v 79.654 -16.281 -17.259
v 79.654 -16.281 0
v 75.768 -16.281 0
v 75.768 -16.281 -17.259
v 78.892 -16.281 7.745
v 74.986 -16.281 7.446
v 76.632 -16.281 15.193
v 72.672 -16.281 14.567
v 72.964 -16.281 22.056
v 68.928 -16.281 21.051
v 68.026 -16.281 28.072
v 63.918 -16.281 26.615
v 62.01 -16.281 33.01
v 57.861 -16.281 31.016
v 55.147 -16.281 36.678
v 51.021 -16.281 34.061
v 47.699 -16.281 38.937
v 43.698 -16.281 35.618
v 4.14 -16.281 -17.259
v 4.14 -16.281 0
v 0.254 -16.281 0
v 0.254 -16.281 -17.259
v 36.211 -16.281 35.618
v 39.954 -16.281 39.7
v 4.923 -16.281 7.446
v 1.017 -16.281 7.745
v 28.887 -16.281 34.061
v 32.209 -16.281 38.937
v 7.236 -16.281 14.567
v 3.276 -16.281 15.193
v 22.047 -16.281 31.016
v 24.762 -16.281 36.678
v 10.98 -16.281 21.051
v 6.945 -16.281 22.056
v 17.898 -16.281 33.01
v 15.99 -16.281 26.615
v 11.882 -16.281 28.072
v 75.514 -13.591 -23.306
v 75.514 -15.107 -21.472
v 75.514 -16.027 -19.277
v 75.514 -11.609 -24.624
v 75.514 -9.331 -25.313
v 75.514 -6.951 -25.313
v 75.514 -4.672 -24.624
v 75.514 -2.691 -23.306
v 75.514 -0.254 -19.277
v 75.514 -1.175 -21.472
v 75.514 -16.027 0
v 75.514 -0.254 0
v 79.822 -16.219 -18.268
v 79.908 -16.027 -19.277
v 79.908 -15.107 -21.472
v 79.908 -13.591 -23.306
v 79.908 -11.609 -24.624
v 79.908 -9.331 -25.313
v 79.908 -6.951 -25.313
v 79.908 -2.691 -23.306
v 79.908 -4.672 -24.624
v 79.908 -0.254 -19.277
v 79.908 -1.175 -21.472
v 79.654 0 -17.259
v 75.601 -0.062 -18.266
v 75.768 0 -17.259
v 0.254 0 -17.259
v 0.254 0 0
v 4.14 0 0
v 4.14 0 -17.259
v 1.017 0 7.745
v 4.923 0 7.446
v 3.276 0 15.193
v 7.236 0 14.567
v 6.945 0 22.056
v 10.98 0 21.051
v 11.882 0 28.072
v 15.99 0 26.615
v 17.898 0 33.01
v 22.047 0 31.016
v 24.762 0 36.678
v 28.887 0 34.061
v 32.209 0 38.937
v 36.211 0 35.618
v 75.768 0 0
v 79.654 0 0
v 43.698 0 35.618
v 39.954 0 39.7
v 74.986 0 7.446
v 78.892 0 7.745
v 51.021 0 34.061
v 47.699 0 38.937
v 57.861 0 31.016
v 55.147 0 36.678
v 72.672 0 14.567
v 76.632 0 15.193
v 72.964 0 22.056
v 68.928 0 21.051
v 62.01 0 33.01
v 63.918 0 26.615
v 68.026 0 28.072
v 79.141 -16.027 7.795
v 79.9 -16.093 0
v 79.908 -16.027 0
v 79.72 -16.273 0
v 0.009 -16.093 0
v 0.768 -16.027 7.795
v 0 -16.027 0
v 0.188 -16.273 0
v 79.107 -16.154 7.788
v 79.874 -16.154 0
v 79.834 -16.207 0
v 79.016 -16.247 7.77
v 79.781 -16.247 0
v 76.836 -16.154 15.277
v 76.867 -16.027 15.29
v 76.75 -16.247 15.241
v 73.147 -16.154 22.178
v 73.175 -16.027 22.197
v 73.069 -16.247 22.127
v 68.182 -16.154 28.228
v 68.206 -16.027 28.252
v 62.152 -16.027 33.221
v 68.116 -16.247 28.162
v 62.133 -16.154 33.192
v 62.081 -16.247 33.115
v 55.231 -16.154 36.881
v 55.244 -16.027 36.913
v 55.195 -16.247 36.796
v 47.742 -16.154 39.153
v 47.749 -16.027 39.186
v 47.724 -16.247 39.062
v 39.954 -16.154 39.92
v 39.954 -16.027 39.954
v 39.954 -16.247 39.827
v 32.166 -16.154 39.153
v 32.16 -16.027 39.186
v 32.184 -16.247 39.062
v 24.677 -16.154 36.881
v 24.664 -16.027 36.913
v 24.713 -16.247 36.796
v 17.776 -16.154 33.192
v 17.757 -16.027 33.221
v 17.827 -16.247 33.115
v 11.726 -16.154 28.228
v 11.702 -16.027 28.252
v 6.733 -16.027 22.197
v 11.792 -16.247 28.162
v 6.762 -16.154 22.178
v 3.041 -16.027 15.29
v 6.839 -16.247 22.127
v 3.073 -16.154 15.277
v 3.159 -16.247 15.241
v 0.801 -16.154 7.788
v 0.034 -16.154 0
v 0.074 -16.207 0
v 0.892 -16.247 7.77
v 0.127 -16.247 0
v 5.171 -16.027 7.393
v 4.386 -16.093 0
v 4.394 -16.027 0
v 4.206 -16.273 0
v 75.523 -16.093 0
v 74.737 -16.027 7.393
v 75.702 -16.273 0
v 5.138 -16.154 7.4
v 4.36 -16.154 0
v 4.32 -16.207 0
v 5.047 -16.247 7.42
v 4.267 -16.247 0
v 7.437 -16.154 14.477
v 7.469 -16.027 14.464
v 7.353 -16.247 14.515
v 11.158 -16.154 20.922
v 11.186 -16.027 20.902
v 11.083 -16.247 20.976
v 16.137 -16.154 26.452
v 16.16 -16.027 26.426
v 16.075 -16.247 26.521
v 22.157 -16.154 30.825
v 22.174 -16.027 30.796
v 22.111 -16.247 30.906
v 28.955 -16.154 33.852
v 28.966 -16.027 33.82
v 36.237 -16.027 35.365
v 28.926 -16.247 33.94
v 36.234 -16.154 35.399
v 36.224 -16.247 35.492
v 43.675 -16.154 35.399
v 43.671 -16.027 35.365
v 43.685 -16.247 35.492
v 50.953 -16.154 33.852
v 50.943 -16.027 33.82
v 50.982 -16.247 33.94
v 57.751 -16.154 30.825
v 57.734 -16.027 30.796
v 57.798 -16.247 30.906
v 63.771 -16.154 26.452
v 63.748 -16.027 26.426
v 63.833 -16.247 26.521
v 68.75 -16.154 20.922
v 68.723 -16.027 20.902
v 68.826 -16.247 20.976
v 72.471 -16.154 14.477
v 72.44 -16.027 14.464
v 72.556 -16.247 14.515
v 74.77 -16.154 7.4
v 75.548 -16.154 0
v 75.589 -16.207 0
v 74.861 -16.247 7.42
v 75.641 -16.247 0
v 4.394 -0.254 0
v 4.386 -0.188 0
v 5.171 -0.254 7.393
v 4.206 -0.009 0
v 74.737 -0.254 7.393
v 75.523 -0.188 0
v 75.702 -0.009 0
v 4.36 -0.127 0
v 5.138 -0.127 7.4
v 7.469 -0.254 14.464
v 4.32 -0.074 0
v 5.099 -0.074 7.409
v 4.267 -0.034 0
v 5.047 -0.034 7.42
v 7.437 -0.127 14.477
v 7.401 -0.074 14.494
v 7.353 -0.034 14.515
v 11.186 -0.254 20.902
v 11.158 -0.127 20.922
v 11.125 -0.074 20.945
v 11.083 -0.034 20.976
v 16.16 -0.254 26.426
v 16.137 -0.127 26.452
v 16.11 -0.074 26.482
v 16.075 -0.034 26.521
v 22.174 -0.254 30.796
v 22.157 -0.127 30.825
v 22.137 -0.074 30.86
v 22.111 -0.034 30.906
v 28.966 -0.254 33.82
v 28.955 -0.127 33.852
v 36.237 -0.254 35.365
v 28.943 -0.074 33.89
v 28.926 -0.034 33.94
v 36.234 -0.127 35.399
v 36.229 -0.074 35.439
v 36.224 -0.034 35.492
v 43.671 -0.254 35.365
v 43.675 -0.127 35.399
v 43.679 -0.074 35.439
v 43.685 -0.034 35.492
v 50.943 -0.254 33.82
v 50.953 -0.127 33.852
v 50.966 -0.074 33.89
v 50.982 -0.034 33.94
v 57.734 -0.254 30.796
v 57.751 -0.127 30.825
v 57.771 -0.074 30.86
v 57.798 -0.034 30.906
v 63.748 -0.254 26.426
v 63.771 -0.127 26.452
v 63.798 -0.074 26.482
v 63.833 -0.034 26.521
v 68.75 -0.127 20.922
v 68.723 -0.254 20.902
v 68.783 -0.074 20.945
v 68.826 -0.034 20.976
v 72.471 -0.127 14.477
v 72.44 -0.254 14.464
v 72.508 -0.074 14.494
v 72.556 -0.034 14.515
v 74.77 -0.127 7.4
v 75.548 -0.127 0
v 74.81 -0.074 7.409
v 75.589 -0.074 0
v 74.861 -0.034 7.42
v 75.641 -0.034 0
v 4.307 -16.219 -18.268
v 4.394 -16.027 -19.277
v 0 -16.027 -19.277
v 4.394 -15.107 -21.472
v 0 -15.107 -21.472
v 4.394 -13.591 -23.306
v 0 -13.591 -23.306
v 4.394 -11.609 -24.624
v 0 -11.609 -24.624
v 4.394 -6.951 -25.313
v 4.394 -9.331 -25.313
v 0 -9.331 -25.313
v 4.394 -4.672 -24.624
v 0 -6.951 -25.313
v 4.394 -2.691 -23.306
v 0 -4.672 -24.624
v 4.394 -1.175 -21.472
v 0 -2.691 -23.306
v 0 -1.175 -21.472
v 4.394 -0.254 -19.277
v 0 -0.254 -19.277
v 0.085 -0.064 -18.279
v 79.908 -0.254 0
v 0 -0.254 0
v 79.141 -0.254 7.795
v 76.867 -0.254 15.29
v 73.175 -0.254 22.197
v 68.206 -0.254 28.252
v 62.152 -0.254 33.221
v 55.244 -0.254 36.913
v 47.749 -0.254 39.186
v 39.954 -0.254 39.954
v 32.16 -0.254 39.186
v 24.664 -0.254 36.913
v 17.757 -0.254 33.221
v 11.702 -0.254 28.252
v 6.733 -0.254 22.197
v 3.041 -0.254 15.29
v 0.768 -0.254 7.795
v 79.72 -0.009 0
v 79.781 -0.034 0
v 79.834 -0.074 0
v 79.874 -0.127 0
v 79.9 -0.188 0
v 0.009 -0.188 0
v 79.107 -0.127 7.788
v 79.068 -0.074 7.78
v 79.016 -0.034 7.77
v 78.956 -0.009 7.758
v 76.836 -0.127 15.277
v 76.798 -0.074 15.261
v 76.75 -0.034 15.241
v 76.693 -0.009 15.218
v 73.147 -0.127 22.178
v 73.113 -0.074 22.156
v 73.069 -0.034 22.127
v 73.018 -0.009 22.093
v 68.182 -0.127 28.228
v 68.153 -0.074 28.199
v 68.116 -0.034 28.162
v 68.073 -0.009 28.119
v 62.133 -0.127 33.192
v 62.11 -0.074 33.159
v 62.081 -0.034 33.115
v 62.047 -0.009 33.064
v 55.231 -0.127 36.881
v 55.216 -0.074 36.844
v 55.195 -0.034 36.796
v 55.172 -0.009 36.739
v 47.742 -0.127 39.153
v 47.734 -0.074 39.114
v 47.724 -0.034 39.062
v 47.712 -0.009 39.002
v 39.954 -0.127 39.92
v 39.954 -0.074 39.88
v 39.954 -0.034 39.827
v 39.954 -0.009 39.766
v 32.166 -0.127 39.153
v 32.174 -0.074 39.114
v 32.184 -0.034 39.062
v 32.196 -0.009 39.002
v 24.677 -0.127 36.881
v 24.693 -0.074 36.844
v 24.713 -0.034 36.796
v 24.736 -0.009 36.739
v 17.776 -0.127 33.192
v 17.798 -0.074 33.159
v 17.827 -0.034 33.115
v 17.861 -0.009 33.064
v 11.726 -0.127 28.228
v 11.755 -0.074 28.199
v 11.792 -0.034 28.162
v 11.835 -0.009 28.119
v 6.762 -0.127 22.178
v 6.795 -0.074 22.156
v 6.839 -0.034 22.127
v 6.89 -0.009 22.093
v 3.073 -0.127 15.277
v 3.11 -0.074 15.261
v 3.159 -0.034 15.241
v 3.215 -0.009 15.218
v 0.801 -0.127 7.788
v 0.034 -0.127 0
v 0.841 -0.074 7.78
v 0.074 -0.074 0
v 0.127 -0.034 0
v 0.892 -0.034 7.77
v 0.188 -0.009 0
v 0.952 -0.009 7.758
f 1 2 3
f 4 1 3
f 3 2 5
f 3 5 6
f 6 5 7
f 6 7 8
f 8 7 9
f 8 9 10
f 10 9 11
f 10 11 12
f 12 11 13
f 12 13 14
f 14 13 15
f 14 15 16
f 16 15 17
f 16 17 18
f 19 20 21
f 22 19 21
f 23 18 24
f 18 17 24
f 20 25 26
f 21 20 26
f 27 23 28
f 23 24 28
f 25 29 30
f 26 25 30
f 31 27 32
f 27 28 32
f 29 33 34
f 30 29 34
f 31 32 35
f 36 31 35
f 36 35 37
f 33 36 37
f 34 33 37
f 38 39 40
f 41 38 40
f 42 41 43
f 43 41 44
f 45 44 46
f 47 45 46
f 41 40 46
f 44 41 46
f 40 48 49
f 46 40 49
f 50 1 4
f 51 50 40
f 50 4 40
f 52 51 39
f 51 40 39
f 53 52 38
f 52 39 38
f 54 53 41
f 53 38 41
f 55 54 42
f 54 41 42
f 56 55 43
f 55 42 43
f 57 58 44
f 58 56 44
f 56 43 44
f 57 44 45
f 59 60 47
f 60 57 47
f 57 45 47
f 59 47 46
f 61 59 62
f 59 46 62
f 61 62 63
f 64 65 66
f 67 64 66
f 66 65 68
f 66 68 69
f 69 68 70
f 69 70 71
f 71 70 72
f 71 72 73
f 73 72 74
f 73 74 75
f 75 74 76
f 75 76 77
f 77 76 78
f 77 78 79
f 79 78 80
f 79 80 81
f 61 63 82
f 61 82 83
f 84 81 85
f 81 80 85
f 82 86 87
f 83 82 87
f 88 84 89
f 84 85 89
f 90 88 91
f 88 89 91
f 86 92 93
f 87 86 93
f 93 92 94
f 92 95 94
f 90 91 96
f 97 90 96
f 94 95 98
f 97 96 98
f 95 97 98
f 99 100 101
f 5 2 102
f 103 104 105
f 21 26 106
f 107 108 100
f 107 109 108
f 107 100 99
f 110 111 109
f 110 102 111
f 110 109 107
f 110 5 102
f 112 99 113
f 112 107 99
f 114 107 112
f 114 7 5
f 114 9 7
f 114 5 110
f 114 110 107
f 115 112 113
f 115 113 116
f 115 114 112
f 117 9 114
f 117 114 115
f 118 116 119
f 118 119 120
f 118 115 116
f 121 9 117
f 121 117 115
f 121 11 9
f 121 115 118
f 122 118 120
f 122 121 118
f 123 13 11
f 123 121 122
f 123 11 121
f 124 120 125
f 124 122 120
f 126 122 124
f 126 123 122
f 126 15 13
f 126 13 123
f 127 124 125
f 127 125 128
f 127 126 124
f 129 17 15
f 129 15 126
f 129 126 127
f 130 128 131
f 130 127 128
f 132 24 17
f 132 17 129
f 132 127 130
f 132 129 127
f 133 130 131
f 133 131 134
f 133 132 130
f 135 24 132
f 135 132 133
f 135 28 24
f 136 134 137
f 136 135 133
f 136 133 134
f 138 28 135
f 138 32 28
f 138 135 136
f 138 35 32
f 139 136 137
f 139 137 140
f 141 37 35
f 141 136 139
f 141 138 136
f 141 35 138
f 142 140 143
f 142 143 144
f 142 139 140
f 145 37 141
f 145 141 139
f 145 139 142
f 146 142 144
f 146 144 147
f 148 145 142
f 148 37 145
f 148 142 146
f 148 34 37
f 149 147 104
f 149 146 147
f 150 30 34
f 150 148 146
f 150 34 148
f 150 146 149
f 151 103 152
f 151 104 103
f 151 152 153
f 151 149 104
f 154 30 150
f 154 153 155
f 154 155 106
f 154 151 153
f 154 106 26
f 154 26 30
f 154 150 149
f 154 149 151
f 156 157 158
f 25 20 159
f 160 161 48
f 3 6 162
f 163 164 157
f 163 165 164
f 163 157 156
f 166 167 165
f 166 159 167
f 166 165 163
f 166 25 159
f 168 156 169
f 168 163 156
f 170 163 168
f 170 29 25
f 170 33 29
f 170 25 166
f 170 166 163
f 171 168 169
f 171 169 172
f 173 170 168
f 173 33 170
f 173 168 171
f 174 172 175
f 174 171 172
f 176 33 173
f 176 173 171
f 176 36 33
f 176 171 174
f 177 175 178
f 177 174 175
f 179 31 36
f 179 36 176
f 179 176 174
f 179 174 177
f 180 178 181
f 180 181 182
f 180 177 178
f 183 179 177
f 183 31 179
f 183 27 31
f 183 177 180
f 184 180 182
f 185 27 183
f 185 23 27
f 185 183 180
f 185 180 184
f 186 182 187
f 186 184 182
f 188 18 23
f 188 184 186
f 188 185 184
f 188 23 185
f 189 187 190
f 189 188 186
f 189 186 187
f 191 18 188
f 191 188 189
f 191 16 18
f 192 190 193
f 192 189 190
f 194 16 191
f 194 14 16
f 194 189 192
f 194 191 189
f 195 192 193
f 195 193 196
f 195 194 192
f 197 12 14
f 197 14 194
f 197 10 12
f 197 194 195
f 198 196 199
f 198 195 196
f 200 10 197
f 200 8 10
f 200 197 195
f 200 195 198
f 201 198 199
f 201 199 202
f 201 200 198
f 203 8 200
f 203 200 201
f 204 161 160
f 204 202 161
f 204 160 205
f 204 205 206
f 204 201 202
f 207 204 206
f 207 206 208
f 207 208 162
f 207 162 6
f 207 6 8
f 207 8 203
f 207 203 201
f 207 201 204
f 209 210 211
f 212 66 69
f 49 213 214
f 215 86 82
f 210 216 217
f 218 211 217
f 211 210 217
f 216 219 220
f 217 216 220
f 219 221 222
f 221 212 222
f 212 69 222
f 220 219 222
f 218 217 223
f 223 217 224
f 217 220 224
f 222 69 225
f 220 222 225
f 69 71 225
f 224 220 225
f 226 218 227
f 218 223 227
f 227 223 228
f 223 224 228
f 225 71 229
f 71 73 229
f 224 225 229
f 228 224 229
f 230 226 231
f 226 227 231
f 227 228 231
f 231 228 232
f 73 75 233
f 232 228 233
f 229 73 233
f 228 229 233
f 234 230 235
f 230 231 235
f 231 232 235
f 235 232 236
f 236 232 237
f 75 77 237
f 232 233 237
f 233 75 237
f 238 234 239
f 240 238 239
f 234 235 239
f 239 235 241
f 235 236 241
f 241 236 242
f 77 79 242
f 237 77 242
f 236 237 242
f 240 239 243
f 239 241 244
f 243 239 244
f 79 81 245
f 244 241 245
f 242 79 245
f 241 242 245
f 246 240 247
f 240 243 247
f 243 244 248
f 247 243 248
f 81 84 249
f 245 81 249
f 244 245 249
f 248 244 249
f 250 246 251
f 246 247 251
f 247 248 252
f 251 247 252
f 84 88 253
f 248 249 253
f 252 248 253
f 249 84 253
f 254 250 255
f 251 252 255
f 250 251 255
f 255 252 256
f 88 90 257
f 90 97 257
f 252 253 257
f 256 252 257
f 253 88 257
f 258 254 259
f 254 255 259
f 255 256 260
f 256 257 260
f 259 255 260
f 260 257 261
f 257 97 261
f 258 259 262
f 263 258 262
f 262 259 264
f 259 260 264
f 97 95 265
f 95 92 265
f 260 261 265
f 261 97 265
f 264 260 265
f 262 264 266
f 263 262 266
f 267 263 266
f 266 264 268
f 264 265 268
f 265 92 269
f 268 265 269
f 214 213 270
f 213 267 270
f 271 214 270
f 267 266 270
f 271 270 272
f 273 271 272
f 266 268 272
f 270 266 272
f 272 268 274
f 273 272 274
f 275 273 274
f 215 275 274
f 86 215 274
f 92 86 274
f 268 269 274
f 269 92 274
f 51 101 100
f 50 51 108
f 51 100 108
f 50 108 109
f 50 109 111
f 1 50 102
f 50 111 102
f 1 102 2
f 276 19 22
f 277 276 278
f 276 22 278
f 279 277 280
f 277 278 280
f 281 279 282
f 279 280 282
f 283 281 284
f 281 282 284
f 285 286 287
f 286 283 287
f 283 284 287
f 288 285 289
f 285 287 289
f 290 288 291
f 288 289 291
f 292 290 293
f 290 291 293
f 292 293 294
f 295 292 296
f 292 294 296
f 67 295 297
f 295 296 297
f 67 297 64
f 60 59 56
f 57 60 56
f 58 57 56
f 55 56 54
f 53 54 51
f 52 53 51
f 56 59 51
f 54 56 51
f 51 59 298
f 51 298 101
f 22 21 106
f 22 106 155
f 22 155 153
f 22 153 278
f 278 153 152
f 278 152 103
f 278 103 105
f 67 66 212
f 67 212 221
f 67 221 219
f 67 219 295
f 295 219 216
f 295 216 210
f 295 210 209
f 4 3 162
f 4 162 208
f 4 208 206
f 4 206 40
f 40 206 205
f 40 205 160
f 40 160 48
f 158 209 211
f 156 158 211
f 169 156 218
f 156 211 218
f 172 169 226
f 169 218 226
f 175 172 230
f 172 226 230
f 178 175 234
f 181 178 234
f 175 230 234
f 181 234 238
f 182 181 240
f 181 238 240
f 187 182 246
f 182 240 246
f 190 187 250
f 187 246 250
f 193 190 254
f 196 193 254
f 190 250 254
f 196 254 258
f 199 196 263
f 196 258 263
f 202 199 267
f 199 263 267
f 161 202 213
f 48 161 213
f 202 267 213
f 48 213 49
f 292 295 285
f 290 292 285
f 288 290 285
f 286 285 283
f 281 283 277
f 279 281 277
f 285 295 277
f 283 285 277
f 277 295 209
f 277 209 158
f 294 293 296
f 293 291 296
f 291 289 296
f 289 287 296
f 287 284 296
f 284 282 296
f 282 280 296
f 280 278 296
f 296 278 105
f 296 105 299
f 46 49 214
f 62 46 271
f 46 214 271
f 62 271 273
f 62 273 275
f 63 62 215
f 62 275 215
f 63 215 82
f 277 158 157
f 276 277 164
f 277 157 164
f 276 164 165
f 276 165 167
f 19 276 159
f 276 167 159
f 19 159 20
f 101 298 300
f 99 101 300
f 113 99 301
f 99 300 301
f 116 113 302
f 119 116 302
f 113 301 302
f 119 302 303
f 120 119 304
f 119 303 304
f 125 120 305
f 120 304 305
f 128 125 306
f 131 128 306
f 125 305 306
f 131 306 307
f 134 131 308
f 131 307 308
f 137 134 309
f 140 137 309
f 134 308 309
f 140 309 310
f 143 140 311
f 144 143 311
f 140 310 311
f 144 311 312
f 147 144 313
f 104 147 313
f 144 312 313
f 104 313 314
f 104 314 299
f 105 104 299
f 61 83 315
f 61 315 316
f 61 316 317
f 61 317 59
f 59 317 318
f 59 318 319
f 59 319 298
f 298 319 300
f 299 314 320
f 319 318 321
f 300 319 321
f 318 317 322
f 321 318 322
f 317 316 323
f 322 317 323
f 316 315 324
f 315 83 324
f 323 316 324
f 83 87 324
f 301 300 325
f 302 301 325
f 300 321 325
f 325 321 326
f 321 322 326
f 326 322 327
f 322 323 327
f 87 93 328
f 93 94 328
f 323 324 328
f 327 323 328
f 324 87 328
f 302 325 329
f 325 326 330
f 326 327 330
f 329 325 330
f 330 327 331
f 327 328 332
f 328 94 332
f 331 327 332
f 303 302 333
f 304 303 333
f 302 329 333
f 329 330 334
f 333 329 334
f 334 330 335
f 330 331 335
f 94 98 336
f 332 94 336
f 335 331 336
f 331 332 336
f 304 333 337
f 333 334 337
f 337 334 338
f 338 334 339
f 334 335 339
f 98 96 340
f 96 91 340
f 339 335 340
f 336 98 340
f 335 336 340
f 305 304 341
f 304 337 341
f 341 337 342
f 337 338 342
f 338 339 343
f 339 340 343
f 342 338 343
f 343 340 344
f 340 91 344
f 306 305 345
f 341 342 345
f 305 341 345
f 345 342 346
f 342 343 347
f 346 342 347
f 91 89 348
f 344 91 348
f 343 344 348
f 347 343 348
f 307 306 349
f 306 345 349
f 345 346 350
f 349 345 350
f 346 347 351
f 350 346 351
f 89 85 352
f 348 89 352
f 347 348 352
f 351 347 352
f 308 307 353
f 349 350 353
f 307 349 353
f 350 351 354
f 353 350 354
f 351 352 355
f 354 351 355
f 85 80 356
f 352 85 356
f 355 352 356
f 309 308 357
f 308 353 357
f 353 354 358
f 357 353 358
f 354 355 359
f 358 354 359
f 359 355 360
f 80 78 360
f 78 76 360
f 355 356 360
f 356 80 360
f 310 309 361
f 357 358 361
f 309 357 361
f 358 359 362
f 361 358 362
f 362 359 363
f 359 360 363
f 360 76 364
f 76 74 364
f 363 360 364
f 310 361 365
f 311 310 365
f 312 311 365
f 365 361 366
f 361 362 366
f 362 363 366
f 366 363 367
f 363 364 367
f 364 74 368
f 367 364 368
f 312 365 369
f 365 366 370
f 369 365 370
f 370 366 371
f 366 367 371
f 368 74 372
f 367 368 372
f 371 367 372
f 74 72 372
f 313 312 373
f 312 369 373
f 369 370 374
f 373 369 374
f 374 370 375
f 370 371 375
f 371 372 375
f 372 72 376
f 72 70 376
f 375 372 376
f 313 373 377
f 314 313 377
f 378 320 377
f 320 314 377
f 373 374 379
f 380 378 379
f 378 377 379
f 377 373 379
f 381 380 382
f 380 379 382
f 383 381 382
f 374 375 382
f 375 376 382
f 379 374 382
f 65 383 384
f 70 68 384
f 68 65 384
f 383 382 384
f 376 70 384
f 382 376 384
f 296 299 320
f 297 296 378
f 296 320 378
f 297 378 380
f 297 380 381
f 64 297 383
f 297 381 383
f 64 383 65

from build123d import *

# Parameters (mm, degrees)
F1_DEPTH = 16.2814
F2_R     = 0.254
F4_DEPTH = 25.4
F6_DEPTH = 79.9094


with BuildPart() as f1:
    # F0 (on Front) → F1 (new body)
    with BuildSketch(Plane.XZ):
        with BuildLine():
            Line((75.5142, 0), (79.9084, 0))
            ThreePointArc((79.9084, 0), (39.9542, 39.9542), (0, 0))
            Line((0, 0), (4.3942, 0))
            ThreePointArc((4.3942, 0), (39.9542, 35.56), (75.5142, 0))
        make_face()
    extrude(amount=F1_DEPTH)

    # F2
    f2_edges = [f1.edges().sort_by_distance(p)[0] for p in [
        (39.9542, -16.2814, 39.9542),
        (39.9542, -16.2814, 35.56),
        (39.9542, 0, 39.9542),
        (39.9542, 0, 35.56),
    ]]
    fillet(f2_edges, radius=F2_R)

    # F3 (on face) → F4 (join)
    with BuildSketch(Plane(origin=(0, 0, 0), x_dir=(1, 0, 0), z_dir=(0, 0, -1))):
        with BuildLine():
            ThreePointArc((0.254, 16.2814), (0.074395, 16.207005), (0, 16.0274))
            Line((0, 16.0274), (0, 0.254))
            ThreePointArc((0, 0.254), (0.074395, 0.074395), (0.254, 0))
            Line((0.254, 0), (4.1402, 0))
            ThreePointArc((4.1402, 0), (4.319805, 0.074395), (4.3942, 0.254))
            Line((4.3942, 0.254), (4.3942, 16.0274))
            ThreePointArc((4.3942, 16.0274), (4.319805, 16.207005), (4.1402, 16.2814))
            Line((4.1402, 16.2814), (0.254, 16.2814))
        make_face()
        with BuildLine():
            ThreePointArc((75.5142, 0.254), (75.588595, 0.074395), (75.7682, 0))
            Line((75.7682, 0), (79.6544, 0))
            ThreePointArc((79.6544, 0), (79.834005, 0.074395), (79.9084, 0.254))
            Line((79.9084, 0.254), (79.9084, 16.0274))
            ThreePointArc((79.9084, 16.0274), (79.834005, 16.207005), (79.6544, 16.2814))
            Line((79.6544, 16.2814), (75.7682, 16.2814))
            ThreePointArc((75.7682, 16.2814), (75.588595, 16.207005), (75.5142, 16.0274))
            Line((75.5142, 16.0274), (75.5142, 0.254))
        make_face()
    extrude(amount=F4_DEPTH)

    # F5 (on face) → F6 (cut, through all)
    with BuildSketch(Plane(origin=(0, 0, 0), x_dir=(0, -1, 0), z_dir=(-1, 0, 0))):
        with BuildLine():
            ThreePointArc((16.2814, -17.2593), (8.1407, -25.4), (0, -17.2593))
            Line((0, -17.2593), (0, -26.5704))
            Line((0, -26.5704), (16.2814, -26.5704))
            Line((16.2814, -26.5704), (16.2814, -17.2593))
        make_face()
    extrude(amount=-F6_DEPTH, mode=Mode.SUBTRACT)


solid = f1.part
